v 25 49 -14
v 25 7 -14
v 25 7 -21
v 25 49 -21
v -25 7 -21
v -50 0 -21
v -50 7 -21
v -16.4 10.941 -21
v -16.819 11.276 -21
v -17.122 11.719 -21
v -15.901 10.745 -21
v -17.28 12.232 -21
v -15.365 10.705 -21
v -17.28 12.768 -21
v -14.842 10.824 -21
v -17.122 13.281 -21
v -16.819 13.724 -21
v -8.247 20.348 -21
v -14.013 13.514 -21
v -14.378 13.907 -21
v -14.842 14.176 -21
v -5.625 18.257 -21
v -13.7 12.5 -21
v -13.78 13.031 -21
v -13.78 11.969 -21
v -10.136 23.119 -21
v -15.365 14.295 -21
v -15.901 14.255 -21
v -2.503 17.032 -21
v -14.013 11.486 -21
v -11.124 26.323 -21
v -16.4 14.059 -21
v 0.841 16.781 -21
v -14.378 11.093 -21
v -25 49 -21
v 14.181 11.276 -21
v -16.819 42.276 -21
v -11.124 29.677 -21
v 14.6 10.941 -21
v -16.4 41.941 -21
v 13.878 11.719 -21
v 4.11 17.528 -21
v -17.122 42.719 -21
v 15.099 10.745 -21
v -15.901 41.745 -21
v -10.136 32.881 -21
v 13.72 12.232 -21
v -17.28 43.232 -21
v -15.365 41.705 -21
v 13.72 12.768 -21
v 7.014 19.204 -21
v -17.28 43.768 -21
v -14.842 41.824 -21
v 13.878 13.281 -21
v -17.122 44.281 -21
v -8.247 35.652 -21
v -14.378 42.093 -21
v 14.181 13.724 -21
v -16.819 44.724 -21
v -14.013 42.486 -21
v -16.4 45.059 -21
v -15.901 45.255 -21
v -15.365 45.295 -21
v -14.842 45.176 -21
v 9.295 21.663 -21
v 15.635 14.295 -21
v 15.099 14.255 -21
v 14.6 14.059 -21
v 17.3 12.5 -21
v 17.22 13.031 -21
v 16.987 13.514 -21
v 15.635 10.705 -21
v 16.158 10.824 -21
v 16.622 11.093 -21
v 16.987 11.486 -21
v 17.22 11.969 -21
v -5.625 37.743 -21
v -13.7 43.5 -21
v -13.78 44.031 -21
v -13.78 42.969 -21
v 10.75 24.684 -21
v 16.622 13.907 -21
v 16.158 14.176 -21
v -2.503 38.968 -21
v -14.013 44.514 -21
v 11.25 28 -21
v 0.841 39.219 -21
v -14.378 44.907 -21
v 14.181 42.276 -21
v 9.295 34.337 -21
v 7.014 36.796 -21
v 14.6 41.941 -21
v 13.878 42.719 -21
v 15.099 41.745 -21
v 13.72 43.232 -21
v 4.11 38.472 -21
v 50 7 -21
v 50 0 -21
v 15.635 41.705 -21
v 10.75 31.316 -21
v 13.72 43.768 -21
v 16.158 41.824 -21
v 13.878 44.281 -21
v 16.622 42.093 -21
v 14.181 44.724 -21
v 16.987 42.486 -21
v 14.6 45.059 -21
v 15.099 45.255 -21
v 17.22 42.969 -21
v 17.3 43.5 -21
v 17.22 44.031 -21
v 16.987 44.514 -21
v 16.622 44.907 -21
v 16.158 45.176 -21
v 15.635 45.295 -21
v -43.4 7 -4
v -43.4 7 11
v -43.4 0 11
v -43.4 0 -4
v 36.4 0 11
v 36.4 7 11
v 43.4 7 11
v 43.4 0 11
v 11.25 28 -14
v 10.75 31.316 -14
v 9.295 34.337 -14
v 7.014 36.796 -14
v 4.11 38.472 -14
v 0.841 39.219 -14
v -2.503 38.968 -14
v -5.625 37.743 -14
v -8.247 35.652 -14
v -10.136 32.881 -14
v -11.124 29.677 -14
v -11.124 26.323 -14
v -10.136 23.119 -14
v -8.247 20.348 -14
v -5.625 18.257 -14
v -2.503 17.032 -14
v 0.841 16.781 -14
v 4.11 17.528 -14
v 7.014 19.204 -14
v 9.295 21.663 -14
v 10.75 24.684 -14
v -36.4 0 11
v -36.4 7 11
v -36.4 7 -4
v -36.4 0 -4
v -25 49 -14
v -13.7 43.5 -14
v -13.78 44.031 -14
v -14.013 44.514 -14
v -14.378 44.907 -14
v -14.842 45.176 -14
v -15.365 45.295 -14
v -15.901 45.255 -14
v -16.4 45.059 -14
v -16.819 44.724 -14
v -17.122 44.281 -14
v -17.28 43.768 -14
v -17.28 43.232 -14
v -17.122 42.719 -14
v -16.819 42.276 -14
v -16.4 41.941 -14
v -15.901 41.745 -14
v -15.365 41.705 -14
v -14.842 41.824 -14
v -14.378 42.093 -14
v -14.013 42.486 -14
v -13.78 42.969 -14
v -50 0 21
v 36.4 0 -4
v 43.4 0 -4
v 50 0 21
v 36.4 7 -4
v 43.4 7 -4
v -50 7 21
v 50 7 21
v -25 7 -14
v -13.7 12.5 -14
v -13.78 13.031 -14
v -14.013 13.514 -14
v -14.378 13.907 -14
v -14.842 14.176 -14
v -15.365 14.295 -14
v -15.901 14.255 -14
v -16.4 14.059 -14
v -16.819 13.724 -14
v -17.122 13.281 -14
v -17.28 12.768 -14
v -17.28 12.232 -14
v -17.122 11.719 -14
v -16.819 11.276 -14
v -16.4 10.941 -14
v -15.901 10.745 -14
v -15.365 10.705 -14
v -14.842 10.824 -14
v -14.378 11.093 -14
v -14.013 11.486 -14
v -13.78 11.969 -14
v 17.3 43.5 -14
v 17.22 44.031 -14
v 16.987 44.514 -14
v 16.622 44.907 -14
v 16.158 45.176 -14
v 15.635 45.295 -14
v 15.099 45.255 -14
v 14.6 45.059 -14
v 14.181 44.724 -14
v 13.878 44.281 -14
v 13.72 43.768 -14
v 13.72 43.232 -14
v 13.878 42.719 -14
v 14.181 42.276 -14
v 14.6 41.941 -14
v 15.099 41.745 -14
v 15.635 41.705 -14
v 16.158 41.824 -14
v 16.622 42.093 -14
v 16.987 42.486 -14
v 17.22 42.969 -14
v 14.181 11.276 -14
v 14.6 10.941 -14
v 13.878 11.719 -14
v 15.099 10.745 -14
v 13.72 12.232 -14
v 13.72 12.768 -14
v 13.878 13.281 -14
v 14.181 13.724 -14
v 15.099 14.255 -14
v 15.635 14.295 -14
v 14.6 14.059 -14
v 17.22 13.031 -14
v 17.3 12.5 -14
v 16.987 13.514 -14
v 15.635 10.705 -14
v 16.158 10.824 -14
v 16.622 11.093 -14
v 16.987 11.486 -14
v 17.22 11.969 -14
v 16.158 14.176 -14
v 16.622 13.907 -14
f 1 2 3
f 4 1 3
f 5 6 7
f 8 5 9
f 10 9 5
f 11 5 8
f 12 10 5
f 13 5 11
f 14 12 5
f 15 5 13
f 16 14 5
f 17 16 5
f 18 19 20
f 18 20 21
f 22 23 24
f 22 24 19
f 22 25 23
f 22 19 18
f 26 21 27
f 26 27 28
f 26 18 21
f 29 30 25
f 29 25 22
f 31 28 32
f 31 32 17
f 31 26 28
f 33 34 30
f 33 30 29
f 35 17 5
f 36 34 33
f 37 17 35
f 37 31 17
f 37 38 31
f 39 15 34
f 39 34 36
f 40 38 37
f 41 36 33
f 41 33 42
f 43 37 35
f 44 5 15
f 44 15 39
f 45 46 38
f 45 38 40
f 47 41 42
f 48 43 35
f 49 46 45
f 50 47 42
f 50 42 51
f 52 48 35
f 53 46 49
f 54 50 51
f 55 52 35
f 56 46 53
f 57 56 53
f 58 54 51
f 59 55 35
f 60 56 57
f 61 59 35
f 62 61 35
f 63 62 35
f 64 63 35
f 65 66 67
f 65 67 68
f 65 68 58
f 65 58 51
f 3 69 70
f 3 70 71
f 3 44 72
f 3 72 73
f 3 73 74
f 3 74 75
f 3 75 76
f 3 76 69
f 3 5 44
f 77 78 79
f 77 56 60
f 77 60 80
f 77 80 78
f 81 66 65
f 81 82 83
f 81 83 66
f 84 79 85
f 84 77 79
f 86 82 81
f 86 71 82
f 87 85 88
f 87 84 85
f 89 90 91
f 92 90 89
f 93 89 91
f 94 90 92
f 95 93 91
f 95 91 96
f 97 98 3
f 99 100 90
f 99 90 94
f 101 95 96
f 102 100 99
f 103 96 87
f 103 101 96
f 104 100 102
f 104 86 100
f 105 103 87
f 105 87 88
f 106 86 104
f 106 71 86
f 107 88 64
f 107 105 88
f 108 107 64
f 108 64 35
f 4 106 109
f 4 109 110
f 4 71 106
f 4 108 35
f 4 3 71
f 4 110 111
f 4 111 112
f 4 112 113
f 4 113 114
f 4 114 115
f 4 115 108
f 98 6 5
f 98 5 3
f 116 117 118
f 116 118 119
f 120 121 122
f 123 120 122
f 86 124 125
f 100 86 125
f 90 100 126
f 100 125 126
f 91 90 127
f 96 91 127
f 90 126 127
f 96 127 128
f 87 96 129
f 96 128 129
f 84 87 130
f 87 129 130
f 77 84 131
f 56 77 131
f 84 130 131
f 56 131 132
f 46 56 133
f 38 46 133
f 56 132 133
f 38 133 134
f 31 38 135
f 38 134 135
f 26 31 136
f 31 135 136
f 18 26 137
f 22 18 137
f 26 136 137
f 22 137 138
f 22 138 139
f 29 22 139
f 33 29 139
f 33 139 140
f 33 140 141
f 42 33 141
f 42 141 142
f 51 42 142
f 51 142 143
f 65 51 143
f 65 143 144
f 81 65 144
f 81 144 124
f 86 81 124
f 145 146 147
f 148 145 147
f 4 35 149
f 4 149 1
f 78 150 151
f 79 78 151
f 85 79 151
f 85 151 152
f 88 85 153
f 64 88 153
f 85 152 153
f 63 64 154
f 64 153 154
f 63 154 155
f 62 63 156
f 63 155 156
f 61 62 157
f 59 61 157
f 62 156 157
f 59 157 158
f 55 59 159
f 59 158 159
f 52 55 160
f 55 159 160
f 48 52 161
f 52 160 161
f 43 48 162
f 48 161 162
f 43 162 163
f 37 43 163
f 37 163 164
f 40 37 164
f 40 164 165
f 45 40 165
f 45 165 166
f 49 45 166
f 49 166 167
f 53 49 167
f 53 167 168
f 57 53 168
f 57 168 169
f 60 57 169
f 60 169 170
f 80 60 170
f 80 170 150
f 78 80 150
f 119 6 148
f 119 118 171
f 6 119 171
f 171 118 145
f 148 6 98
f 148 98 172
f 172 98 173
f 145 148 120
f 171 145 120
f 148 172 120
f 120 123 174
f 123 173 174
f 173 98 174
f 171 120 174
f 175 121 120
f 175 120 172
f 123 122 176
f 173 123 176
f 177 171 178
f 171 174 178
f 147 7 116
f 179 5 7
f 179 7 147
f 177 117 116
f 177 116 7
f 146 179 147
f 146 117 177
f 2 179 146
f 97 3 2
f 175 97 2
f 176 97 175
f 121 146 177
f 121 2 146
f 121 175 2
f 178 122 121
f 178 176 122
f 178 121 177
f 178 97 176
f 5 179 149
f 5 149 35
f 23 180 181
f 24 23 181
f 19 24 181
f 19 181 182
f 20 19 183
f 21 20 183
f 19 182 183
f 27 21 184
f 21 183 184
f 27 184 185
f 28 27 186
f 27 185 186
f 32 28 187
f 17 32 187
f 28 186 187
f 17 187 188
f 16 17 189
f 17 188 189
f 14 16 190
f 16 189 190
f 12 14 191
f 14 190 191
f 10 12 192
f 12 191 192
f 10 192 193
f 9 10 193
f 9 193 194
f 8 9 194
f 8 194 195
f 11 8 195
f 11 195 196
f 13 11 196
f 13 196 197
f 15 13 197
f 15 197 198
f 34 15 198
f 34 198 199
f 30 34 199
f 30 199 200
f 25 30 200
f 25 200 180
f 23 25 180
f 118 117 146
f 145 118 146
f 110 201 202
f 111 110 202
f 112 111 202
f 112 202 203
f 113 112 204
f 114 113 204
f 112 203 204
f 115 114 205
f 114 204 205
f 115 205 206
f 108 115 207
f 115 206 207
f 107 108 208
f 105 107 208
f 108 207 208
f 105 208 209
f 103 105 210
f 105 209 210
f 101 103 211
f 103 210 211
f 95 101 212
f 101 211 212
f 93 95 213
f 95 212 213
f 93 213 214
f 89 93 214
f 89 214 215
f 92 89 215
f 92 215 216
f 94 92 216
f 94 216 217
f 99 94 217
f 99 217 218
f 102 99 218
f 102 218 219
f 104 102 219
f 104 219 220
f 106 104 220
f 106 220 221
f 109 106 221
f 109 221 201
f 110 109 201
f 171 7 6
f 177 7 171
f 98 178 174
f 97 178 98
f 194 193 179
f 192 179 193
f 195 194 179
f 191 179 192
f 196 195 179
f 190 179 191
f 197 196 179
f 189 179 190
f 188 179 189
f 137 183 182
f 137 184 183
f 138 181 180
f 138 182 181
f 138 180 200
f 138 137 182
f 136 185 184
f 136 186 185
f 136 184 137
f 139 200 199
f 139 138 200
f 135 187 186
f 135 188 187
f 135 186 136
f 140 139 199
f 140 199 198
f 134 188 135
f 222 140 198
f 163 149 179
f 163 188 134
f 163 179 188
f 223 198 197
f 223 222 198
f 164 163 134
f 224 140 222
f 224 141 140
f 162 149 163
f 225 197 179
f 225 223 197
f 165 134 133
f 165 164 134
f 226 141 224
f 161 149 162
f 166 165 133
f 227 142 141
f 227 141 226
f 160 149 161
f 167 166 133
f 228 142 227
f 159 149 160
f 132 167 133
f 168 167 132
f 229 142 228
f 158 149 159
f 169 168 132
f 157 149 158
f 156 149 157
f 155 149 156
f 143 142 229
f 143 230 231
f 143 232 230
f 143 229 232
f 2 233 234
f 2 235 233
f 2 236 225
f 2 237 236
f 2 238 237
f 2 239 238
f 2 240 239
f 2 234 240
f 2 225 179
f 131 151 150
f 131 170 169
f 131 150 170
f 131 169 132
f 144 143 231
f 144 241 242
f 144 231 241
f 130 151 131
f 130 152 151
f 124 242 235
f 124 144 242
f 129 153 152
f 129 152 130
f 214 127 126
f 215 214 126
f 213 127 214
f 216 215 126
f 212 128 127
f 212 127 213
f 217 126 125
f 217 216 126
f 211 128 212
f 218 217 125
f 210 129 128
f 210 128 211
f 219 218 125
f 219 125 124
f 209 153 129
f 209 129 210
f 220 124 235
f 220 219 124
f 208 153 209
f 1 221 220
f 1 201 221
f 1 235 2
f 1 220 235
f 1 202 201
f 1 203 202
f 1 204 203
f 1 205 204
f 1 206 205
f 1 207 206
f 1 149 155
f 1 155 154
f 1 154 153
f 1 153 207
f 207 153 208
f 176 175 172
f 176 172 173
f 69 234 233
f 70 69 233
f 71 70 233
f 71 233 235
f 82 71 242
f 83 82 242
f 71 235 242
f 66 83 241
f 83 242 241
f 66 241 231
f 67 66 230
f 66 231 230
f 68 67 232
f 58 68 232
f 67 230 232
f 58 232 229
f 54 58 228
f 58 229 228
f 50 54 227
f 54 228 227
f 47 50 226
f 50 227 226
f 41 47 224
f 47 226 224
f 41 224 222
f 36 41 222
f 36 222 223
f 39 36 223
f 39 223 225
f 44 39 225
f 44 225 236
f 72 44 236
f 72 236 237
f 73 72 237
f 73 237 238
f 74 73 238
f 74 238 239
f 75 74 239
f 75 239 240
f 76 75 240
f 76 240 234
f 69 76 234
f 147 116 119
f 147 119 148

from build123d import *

# Parameters (mm, degrees)
SKETCH1_W           = 50
SKETCH1_H           = 42
BOSS_EXTRUDE1_DEPTH = 49
SKETCH2_W           = 50
SKETCH2_H           = 35
CUT_EXTRUDE1_DEPTH  = 42
SKETCH3_W           = 42
SKETCH3_H           = 7
BOSS_EXTRUDE2_DEPTH = 25
SKETCH4_W           = 42
SKETCH4_H           = 7
BOSS_EXTRUDE3_DEPTH = 25
SKETCH5_R           = 11.25
SKETCH5_R_2         = 1.8
CUT_EXTRUDE2_DEPTH  = 79.268767717
SKETCH6_W           = 7
SKETCH6_H           = 15
CUT_EXTRUDE3_DEPTH  = 69.593002559


with BuildPart() as part:
    # Sketch1 → Boss-Extrude1 (new body)
    with BuildSketch(Plane(origin=(0, 0, 0), x_dir=(1, 0, 0), z_dir=(0, 1, 0))):
        Rectangle(SKETCH1_W, SKETCH1_H)
    extrude(amount=BOSS_EXTRUDE1_DEPTH)

    # Sketch2 → Cut-Extrude1 (cut)
    with BuildSketch(Plane(origin=(0, 49, 0), x_dir=(1, 0, 0), z_dir=(0, 1, 0))):
        with Locations((0, -3.5)):
            Rectangle(SKETCH2_W, SKETCH2_H)
    extrude(amount=-CUT_EXTRUDE1_DEPTH, mode=Mode.SUBTRACT)

    # Sketch3 → Boss-Extrude2 (add)
    with BuildSketch(Plane(origin=(25, 0, 0), x_dir=(0, 0, -1), z_dir=(1, 0, 0))):
        with Locations((0, 3.5)):
            Rectangle(SKETCH3_W, SKETCH3_H)
    extrude(amount=BOSS_EXTRUDE2_DEPTH)

    # Sketch4 → Boss-Extrude3 (add)
    with BuildSketch(Plane.ZY.offset(25)):
        with Locations((0, 3.5)):
            Rectangle(SKETCH4_W, SKETCH4_H)
    extrude(amount=BOSS_EXTRUDE3_DEPTH)

    # Sketch5 → Cut-Extrude2 (cut, through all)
    with BuildSketch(Plane.XY.offset(-14)):
        with Locations((0, 28)):
            Circle(SKETCH5_R)
        with Locations((-15.5, 43.5)):
            Circle(SKETCH5_R_2)
        with Locations((15.5, 43.5)):
            Circle(SKETCH5_R_2)
        with Locations((-15.5, 12.5)):
            Circle(SKETCH5_R_2)
        with Locations((15.5, 12.5)):
            Circle(SKETCH5_R_2)
    extrude(amount=-CUT_EXTRUDE2_DEPTH, mode=Mode.SUBTRACT)

    # Sketch6 → Cut-Extrude3 (cut, through all)
    with BuildSketch(Plane(origin=(0, 7, 0), x_dir=(1, 0, 0), z_dir=(0, 1, 0))):
        with Locations((-39.9, -3.5)):
            Rectangle(SKETCH6_W, SKETCH6_H)
        with Locations((39.9, -3.5)):
            Rectangle(SKETCH6_W, SKETCH6_H)
    extrude(amount=-CUT_EXTRUDE3_DEPTH, mode=Mode.SUBTRACT)


solid = part.part
